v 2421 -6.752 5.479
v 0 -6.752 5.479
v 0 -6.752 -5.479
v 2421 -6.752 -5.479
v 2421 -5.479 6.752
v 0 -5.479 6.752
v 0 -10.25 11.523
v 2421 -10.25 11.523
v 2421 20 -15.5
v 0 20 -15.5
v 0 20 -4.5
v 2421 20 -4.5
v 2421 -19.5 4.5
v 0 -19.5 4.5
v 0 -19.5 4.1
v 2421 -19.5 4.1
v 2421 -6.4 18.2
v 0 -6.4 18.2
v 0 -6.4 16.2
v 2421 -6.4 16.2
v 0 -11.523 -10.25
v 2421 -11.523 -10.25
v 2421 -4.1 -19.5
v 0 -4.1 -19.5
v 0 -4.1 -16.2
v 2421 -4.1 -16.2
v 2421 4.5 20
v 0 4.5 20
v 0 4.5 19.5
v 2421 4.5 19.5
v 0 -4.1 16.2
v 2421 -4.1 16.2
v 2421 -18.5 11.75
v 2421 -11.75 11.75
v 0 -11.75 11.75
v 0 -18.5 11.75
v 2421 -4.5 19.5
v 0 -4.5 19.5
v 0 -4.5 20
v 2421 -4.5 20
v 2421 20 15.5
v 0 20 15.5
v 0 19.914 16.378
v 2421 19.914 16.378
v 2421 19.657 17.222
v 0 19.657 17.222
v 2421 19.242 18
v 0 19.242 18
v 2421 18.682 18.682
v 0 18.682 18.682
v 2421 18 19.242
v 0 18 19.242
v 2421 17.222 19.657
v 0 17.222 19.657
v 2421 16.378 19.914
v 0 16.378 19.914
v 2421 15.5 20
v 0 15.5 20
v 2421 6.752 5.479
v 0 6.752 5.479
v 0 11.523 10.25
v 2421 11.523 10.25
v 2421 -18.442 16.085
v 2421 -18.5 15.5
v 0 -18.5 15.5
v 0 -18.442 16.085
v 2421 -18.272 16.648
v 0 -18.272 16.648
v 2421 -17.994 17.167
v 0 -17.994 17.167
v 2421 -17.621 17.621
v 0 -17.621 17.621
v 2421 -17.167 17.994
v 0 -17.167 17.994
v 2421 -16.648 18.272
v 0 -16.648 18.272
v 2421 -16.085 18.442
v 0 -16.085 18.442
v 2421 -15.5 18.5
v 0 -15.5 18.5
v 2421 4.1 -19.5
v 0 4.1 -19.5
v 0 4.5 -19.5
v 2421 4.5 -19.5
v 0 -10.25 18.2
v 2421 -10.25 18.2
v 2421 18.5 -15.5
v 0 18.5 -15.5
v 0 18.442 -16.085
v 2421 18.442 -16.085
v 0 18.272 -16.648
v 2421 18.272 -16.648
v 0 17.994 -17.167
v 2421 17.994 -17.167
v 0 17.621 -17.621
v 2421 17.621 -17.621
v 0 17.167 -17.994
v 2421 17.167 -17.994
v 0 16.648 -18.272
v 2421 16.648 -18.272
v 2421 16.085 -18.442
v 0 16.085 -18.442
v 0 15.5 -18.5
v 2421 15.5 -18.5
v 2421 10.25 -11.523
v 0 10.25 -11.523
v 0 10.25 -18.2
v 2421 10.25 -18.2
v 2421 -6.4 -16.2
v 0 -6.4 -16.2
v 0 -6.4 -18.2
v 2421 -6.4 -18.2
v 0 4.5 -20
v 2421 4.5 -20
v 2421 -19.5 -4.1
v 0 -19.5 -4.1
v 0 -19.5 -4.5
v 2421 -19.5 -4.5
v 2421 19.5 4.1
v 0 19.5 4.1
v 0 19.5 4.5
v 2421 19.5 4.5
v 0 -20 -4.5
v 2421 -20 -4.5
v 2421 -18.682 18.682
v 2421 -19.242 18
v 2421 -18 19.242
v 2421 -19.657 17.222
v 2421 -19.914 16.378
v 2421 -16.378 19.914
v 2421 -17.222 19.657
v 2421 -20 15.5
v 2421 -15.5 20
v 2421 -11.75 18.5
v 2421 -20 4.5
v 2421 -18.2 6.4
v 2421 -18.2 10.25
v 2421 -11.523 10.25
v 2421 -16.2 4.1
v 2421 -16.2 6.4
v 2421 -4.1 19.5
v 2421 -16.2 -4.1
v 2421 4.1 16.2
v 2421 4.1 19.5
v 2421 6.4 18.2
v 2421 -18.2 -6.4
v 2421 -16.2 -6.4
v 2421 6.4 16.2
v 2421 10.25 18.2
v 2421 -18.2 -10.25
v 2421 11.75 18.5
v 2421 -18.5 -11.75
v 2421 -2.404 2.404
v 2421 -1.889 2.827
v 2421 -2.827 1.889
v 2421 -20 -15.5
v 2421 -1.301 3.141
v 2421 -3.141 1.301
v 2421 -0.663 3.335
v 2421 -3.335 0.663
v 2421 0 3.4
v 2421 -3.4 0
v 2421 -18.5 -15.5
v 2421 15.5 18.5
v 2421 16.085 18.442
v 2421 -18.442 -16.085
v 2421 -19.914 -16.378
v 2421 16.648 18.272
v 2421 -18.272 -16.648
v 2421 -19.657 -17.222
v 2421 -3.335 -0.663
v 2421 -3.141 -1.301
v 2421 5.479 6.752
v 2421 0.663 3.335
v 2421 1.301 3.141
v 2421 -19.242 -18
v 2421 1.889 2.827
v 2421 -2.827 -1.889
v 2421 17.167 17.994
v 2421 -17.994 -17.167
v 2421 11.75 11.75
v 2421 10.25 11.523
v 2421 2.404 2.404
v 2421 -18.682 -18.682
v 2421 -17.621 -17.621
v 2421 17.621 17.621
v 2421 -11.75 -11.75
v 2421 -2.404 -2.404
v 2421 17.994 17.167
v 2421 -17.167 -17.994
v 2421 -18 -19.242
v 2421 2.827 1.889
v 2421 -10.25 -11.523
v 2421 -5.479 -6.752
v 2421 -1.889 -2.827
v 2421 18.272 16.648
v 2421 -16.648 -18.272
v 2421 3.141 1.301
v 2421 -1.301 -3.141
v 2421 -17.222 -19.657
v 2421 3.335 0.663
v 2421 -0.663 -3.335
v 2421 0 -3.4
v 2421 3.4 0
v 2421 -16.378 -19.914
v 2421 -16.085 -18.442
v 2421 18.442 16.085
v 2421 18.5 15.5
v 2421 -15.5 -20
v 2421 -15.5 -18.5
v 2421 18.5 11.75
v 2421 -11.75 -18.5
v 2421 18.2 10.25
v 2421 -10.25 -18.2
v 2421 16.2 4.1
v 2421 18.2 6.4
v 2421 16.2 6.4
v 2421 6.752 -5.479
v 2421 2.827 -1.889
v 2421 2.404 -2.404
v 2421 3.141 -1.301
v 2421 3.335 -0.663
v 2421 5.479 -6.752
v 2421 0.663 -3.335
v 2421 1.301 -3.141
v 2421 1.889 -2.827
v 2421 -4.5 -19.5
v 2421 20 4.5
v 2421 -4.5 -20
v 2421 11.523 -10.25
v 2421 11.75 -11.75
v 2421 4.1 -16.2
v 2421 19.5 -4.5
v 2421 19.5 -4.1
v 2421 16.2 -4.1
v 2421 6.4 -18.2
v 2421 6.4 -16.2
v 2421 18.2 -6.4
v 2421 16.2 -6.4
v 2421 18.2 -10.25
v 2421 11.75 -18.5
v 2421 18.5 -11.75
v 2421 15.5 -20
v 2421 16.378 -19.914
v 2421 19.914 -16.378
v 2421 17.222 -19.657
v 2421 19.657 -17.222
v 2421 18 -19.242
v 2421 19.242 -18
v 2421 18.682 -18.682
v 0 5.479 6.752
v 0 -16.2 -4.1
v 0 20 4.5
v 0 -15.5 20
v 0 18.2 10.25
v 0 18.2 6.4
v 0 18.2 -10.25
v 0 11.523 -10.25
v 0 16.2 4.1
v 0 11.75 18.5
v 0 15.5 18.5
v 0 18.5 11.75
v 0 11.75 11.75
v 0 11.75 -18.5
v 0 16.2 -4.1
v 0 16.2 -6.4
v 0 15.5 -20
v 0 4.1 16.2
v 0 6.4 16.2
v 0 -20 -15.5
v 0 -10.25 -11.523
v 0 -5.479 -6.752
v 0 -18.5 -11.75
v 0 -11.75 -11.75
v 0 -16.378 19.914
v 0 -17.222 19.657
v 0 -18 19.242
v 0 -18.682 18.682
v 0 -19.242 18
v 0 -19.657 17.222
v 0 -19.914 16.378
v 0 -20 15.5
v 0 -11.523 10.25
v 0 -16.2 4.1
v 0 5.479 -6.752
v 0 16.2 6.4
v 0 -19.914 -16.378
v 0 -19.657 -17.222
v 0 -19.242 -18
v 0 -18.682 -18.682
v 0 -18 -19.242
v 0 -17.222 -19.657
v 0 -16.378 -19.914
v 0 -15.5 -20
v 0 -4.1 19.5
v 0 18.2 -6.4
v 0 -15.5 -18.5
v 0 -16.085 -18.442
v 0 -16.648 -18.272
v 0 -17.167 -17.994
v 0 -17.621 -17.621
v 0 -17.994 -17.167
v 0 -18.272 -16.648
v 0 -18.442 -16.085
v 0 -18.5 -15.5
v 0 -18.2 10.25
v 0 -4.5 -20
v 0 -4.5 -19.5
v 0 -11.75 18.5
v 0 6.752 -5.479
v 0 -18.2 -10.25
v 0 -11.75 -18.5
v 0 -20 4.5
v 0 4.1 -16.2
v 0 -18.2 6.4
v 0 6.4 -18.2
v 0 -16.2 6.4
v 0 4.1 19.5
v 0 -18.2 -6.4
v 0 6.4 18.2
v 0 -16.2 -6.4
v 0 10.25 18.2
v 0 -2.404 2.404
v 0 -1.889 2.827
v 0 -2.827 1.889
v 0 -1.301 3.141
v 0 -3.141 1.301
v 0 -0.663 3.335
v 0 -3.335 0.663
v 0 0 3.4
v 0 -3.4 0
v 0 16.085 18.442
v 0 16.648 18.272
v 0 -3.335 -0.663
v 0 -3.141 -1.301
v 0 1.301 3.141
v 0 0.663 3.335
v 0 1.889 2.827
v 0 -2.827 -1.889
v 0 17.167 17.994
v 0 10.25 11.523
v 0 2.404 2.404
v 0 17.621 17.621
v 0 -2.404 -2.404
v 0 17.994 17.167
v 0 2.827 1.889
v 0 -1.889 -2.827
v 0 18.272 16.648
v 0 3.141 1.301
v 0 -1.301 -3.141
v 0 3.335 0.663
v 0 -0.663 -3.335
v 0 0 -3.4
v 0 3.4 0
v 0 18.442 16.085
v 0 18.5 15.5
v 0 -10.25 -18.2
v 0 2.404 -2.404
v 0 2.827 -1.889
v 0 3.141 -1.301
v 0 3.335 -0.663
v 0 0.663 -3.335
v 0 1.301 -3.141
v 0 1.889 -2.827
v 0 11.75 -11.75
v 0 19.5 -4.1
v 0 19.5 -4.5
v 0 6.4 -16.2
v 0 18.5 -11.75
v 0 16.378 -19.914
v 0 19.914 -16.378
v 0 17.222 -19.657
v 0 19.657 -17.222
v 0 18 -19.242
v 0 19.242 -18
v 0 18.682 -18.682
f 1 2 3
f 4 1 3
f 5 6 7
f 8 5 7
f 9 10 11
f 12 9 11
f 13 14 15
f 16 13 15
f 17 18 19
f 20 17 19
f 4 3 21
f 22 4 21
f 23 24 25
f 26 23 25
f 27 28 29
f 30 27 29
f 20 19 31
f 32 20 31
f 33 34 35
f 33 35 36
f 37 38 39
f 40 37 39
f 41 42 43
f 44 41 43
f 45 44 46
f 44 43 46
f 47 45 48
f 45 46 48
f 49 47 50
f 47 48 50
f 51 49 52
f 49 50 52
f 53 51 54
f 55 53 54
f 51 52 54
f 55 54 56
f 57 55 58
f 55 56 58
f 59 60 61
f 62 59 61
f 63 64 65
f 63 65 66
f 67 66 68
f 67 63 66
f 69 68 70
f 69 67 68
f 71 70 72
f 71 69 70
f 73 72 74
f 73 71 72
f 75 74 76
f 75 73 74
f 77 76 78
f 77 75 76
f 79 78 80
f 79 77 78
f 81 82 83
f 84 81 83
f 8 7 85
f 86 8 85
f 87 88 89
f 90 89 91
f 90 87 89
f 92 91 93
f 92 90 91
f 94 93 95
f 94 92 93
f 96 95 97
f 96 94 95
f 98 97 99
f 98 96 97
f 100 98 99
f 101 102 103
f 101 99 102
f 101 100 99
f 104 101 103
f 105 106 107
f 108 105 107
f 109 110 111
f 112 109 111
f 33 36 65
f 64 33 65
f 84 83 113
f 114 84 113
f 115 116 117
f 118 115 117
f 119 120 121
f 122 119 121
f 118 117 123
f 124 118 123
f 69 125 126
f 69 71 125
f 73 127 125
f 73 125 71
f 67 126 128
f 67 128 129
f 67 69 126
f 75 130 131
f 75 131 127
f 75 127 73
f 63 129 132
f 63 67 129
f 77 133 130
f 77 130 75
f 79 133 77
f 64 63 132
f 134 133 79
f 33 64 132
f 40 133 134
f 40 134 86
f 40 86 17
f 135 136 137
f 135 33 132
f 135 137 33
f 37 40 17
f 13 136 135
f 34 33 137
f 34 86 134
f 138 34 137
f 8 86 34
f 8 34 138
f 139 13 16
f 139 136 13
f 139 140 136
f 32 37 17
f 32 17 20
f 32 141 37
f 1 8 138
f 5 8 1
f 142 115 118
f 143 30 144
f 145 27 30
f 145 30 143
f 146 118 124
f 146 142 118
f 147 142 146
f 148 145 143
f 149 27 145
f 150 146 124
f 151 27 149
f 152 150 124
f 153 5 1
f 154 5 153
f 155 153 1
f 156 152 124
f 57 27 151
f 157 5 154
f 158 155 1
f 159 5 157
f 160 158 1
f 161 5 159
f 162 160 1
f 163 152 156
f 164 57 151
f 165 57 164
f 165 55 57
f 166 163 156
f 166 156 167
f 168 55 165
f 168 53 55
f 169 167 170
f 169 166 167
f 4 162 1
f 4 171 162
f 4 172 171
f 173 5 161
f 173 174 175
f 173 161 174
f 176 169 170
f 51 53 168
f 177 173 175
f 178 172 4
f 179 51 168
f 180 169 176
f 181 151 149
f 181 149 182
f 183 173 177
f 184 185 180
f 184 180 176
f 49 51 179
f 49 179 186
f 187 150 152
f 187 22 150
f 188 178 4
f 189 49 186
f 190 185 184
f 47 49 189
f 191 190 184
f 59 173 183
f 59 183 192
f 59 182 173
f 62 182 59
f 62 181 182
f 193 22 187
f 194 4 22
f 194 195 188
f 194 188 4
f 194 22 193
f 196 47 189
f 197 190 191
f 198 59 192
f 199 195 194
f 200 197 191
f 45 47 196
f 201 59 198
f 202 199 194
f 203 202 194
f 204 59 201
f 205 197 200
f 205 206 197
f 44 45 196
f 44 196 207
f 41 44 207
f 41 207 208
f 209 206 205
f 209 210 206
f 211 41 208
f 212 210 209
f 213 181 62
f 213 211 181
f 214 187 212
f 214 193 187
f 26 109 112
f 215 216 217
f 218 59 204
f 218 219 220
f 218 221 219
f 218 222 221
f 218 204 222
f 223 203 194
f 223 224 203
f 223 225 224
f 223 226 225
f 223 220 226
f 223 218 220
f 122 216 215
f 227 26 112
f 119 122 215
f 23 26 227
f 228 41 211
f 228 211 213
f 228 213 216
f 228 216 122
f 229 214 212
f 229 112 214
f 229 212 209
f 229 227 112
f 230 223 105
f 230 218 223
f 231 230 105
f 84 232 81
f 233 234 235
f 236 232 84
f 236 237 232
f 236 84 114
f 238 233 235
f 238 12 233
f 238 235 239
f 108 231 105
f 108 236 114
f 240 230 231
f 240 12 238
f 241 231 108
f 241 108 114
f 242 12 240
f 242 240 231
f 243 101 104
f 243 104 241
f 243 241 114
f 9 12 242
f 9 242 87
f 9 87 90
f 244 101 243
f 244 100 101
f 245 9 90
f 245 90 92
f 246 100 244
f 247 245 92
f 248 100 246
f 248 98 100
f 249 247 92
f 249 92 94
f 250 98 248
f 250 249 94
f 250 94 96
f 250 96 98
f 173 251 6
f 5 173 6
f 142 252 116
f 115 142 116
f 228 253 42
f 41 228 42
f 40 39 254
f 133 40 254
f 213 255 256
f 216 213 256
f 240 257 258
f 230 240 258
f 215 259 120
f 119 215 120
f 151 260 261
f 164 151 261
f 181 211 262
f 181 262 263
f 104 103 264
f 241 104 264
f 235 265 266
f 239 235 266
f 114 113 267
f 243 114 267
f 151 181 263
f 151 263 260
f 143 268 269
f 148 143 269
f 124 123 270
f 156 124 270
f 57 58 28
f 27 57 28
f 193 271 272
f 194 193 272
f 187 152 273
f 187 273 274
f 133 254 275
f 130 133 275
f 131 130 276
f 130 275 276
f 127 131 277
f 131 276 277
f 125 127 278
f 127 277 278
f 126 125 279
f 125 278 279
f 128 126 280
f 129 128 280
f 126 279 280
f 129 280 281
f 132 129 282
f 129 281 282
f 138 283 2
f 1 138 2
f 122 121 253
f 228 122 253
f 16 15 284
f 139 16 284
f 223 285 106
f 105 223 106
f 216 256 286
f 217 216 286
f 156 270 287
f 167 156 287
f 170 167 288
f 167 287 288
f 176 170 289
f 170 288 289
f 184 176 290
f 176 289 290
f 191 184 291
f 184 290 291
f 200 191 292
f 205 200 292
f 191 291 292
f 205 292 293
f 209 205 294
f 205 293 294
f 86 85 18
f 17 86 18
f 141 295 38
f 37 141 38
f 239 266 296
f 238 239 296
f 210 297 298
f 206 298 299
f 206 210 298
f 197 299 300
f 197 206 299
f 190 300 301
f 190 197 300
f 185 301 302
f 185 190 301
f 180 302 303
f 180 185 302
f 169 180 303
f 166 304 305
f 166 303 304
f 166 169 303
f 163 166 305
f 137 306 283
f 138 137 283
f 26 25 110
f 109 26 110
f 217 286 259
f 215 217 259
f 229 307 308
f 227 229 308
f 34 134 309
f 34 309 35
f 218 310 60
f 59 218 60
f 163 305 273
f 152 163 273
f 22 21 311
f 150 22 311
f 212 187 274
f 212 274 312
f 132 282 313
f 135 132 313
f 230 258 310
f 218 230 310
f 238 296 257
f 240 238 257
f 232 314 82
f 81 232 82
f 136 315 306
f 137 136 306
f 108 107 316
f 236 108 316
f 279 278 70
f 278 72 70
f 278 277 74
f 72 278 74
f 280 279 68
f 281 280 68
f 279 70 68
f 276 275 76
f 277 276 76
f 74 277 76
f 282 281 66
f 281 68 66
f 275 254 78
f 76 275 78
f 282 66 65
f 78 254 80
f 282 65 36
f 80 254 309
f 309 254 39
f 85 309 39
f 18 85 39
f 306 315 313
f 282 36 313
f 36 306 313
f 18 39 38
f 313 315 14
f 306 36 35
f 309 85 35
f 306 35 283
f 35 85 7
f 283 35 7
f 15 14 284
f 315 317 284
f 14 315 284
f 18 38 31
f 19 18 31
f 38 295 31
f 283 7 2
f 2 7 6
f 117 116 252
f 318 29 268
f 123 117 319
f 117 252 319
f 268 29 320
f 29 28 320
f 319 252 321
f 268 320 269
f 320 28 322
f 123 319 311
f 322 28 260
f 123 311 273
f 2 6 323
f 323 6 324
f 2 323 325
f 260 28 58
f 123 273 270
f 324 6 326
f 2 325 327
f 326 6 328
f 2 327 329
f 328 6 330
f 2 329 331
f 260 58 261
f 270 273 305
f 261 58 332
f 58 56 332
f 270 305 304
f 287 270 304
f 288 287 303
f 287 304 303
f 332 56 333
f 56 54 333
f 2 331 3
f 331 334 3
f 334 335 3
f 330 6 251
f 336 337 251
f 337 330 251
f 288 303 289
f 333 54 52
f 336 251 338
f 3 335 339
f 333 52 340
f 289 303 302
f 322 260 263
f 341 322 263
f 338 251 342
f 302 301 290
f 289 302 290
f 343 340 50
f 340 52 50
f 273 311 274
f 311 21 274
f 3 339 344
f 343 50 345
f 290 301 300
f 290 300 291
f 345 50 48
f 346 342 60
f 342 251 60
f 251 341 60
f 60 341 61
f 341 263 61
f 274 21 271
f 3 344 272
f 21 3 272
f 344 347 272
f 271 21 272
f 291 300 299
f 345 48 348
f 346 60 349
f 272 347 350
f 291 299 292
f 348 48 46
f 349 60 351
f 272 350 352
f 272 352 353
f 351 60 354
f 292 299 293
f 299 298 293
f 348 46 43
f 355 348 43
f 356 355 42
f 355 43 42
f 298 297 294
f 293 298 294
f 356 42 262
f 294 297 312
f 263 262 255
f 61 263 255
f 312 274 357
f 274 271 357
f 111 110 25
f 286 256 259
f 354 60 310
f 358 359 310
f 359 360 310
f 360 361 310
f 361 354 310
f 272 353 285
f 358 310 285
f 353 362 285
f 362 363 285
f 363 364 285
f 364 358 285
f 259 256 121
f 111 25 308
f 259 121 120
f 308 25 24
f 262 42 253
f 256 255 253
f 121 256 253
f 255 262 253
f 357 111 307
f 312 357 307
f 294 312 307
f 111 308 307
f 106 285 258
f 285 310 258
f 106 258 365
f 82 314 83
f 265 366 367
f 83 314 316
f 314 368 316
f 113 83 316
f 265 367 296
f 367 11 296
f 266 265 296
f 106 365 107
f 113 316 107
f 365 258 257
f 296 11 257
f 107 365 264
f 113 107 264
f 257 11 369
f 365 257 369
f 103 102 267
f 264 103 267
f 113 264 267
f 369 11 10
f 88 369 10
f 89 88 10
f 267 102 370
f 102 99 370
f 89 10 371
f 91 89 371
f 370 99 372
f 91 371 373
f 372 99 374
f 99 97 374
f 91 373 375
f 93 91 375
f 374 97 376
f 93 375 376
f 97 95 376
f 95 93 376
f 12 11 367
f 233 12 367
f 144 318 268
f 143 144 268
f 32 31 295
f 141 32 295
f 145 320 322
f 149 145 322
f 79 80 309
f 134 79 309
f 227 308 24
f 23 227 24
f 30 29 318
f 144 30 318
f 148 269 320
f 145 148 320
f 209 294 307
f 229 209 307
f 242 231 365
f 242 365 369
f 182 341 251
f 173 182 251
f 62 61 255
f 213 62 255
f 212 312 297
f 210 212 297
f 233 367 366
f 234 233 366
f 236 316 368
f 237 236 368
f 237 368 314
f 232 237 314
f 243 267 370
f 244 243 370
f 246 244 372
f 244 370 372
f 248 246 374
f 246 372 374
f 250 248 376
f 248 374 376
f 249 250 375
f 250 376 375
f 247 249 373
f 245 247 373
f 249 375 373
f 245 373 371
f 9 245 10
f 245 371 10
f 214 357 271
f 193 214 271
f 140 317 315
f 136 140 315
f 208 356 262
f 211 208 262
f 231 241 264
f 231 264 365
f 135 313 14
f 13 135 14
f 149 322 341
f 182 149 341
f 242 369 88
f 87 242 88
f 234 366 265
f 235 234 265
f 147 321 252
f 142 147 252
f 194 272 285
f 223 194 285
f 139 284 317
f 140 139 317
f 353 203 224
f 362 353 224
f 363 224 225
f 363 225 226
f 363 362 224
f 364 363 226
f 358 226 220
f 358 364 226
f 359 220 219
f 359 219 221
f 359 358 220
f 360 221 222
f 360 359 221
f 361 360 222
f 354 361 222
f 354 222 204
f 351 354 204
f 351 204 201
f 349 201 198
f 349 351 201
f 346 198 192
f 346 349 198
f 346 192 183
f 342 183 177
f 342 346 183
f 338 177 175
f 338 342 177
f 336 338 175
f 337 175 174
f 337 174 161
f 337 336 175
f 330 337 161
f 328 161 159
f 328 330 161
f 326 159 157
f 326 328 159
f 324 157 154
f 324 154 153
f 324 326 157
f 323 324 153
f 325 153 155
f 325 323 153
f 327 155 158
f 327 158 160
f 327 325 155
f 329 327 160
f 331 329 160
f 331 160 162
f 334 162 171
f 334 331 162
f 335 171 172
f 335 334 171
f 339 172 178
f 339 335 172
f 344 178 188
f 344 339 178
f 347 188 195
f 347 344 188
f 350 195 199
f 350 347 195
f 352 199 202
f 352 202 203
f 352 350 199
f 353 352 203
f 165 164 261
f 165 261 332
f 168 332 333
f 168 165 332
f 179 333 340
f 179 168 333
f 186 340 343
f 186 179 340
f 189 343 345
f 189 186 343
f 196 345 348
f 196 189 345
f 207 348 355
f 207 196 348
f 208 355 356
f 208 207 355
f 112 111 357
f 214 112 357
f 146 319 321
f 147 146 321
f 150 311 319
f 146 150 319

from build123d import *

# Parameters (mm, degrees)
SKETCH_3_R          = 3.4
EXTRUDE_1_DEPTH     = 2421
CUT_EXTRUDE_3_DEPTH = 3297


with BuildPart() as part:
    # 草图3 → 凸台-拉伸1 (new body)
    with BuildSketch(Plane(origin=(0, 0, 0), x_dir=(0, 0, -1), z_dir=(1, 0, 0))):
        with BuildLine():
            Line((-15.5, -20), (-4.5, -20))
            Line((-4.5, -20), (-4.5, -19.5))
            Line((-4.5, -19.5), (-4.1, -19.5))
            Line((-4.1, -19.5), (-4.1, -16.2))
            Line((-4.1, -16.2), (-6.4, -16.2))
            Line((-6.4, -16.2), (-6.4, -18.2))
            Line((-6.4, -18.2), (-10.25, -18.2))
            Line((-10.25, -18.2), (-10.25, -11.522792206))
            Line((-10.25, -11.522792206), (-5.479130441, -6.751922647))
            Line((-5.479130441, -6.751922647), (5.479130441, -6.751922647))
            Line((5.479130441, -6.751922647), (10.25, -11.522792206))
            Line((10.25, -11.522792206), (10.25, -18.2))
            Line((10.25, -18.2), (6.4, -18.2))
            Line((6.4, -18.2), (6.4, -16.2))
            Line((6.4, -16.2), (4.1, -16.2))
            Line((4.1, -16.2), (4.1, -19.5))
            Line((4.1, -19.5), (4.5, -19.5))
            Line((4.5, -19.5), (4.5, -20))
            Line((4.5, -20), (15.5, -20))
            ThreePointArc((15.5, -20), (18.681980515, -18.681980515), (20, -15.5))
            Line((20, -15.5), (20, -4.5))
            Line((20, -4.5), (19.5, -4.5))
            Line((19.5, -4.5), (19.5, -4.1))
            Line((19.5, -4.1), (16.2, -4.1))
            Line((16.2, -4.1), (16.2, -6.4))
            Line((16.2, -6.4), (18.2, -6.4))
            Line((18.2, -6.4), (18.2, -10.25))
            Line((18.2, -10.25), (11.522792206, -10.25))
            Line((11.522792206, -10.25), (6.751922647, -5.479130441))
            Line((6.751922647, -5.479130441), (6.751922647, 5.479130441))
            Line((6.751922647, 5.479130441), (11.522792206, 10.25))
            Line((11.522792206, 10.25), (18.2, 10.25))
            Line((18.2, 10.25), (18.2, 6.4))
            Line((18.2, 6.4), (16.2, 6.4))
            Line((16.2, 6.4), (16.2, 4.1))
            Line((16.2, 4.1), (19.5, 4.1))
            Line((19.5, 4.1), (19.5, 4.5))
            Line((19.5, 4.5), (20, 4.5))
            Line((20, 4.5), (20, 15.5))
            ThreePointArc((20, 15.5), (18.681980515, 18.681980515), (15.5, 20))
            Line((15.5, 20), (4.5, 20))
            Line((4.5, 20), (4.5, 19.5))
            Line((4.5, 19.5), (4.1, 19.5))
            Line((4.1, 19.5), (4.1, 16.2))
            Line((4.1, 16.2), (6.4, 16.2))
            Line((6.4, 16.2), (6.4, 18.2))
            Line((6.4, 18.2), (10.25, 18.2))
            Line((10.25, 18.2), (10.25, 11.522792206))
            Line((10.25, 11.522792206), (5.479130441, 6.751922647))
            Line((5.479130441, 6.751922647), (-5.479130441, 6.751922647))
            Line((-5.479130441, 6.751922647), (-10.25, 11.522792206))
            Line((-10.25, 11.522792206), (-10.25, 18.2))
            Line((-10.25, 18.2), (-6.4, 18.2))
            Line((-6.4, 18.2), (-6.4, 16.2))
            Line((-6.4, 16.2), (-4.1, 16.2))
            Line((-4.1, 16.2), (-4.1, 19.5))
            Line((-4.1, 19.5), (-4.5, 19.5))
            Line((-4.5, 19.5), (-4.5, 20))
            Line((-4.5, 20), (-15.5, 20))
            ThreePointArc((-15.5, 20), (-18.681980515, 18.681980515), (-20, 15.5))
            Line((-20, 15.5), (-20, 4.5))
            Line((-20, 4.5), (-19.5, 4.5))
            Line((-19.5, 4.5), (-19.5, 4.1))
            Line((-19.5, 4.1), (-16.2, 4.1))
            Line((-16.2, 4.1), (-16.2, 6.4))
            Line((-16.2, 6.4), (-18.2, 6.4))
            Line((-18.2, 6.4), (-18.2, 10.25))
            Line((-18.2, 10.25), (-11.522792206, 10.25))
            Line((-11.522792206, 10.25), (-6.751922647, 5.479130441))
            Line((-6.751922647, 5.479130441), (-6.751922647, -5.479130441))
            Line((-6.751922647, -5.479130441), (-11.522792206, -10.25))
            Line((-11.522792206, -10.25), (-18.2, -10.25))
            Line((-18.2, -10.25), (-18.2, -6.4))
            Line((-18.2, -6.4), (-16.2, -6.4))
            Line((-16.2, -6.4), (-16.2, -4.1))
            Line((-16.2, -4.1), (-19.5, -4.1))
            Line((-19.5, -4.1), (-19.5, -4.5))
            Line((-19.5, -4.5), (-20, -4.5))
            Line((-20, -4.5), (-20, -15.5))
            ThreePointArc((-20, -15.5), (-18.681980515, -18.681980515), (-15.5, -20))
        make_face()
        Circle(SKETCH_3_R, mode=Mode.SUBTRACT)
    extrude(amount=EXTRUDE_1_DEPTH)

    # 草图4 → 切除-拉伸3 (cut)
    with BuildSketch(Plane(origin=(2421, -20, 15.5), x_dir=(0, 0, 1), z_dir=(-1, 0, 0))):
        with BuildLine():
            Line((-3.75, 31.75), (3, 31.75))
            Line((3, 31.75), (3, 35.5))
            ThreePointArc((3, 35.5), (2.121320344, 37.621320344), (0, 38.5))
            Line((0, 38.5), (-3.75, 38.5))
            Line((-3.75, 38.5), (-3.75, 31.75))
        make_face()
        with BuildLine():
            Line((-3.75, 8.25), (-3.75, 1.5))
            Line((-3.75, 1.5), (0, 1.5))
            ThreePointArc((0, 1.5), (2.121320344, 2.378679656), (3, 4.5))
            Line((3, 4.5), (3, 8.25))
            Line((3, 8.25), (-3.75, 8.25))
        make_face()
        with BuildLine():
            Line((-27.25, 8.25), (-34, 8.25))
            Line((-34, 8.25), (-34, 4.5))
            ThreePointArc((-34, 4.5), (-33.121320344, 2.378679656), (-31, 1.5))
            Line((-31, 1.5), (-27.25, 1.5))
            Line((-27.25, 1.5), (-27.25, 8.25))
        make_face()
        with BuildLine():
            Line((-27.25, 31.75), (-27.25, 38.5))
            Line((-27.25, 38.5), (-31, 38.5))
            ThreePointArc((-31, 38.5), (-33.121320344, 37.621320344), (-34, 35.5))
            Line((-34, 35.5), (-34, 31.75))
            Line((-34, 31.75), (-27.25, 31.75))
        make_face()
    extrude(amount=CUT_EXTRUDE_3_DEPTH, mode=Mode.SUBTRACT)


solid = part.part
